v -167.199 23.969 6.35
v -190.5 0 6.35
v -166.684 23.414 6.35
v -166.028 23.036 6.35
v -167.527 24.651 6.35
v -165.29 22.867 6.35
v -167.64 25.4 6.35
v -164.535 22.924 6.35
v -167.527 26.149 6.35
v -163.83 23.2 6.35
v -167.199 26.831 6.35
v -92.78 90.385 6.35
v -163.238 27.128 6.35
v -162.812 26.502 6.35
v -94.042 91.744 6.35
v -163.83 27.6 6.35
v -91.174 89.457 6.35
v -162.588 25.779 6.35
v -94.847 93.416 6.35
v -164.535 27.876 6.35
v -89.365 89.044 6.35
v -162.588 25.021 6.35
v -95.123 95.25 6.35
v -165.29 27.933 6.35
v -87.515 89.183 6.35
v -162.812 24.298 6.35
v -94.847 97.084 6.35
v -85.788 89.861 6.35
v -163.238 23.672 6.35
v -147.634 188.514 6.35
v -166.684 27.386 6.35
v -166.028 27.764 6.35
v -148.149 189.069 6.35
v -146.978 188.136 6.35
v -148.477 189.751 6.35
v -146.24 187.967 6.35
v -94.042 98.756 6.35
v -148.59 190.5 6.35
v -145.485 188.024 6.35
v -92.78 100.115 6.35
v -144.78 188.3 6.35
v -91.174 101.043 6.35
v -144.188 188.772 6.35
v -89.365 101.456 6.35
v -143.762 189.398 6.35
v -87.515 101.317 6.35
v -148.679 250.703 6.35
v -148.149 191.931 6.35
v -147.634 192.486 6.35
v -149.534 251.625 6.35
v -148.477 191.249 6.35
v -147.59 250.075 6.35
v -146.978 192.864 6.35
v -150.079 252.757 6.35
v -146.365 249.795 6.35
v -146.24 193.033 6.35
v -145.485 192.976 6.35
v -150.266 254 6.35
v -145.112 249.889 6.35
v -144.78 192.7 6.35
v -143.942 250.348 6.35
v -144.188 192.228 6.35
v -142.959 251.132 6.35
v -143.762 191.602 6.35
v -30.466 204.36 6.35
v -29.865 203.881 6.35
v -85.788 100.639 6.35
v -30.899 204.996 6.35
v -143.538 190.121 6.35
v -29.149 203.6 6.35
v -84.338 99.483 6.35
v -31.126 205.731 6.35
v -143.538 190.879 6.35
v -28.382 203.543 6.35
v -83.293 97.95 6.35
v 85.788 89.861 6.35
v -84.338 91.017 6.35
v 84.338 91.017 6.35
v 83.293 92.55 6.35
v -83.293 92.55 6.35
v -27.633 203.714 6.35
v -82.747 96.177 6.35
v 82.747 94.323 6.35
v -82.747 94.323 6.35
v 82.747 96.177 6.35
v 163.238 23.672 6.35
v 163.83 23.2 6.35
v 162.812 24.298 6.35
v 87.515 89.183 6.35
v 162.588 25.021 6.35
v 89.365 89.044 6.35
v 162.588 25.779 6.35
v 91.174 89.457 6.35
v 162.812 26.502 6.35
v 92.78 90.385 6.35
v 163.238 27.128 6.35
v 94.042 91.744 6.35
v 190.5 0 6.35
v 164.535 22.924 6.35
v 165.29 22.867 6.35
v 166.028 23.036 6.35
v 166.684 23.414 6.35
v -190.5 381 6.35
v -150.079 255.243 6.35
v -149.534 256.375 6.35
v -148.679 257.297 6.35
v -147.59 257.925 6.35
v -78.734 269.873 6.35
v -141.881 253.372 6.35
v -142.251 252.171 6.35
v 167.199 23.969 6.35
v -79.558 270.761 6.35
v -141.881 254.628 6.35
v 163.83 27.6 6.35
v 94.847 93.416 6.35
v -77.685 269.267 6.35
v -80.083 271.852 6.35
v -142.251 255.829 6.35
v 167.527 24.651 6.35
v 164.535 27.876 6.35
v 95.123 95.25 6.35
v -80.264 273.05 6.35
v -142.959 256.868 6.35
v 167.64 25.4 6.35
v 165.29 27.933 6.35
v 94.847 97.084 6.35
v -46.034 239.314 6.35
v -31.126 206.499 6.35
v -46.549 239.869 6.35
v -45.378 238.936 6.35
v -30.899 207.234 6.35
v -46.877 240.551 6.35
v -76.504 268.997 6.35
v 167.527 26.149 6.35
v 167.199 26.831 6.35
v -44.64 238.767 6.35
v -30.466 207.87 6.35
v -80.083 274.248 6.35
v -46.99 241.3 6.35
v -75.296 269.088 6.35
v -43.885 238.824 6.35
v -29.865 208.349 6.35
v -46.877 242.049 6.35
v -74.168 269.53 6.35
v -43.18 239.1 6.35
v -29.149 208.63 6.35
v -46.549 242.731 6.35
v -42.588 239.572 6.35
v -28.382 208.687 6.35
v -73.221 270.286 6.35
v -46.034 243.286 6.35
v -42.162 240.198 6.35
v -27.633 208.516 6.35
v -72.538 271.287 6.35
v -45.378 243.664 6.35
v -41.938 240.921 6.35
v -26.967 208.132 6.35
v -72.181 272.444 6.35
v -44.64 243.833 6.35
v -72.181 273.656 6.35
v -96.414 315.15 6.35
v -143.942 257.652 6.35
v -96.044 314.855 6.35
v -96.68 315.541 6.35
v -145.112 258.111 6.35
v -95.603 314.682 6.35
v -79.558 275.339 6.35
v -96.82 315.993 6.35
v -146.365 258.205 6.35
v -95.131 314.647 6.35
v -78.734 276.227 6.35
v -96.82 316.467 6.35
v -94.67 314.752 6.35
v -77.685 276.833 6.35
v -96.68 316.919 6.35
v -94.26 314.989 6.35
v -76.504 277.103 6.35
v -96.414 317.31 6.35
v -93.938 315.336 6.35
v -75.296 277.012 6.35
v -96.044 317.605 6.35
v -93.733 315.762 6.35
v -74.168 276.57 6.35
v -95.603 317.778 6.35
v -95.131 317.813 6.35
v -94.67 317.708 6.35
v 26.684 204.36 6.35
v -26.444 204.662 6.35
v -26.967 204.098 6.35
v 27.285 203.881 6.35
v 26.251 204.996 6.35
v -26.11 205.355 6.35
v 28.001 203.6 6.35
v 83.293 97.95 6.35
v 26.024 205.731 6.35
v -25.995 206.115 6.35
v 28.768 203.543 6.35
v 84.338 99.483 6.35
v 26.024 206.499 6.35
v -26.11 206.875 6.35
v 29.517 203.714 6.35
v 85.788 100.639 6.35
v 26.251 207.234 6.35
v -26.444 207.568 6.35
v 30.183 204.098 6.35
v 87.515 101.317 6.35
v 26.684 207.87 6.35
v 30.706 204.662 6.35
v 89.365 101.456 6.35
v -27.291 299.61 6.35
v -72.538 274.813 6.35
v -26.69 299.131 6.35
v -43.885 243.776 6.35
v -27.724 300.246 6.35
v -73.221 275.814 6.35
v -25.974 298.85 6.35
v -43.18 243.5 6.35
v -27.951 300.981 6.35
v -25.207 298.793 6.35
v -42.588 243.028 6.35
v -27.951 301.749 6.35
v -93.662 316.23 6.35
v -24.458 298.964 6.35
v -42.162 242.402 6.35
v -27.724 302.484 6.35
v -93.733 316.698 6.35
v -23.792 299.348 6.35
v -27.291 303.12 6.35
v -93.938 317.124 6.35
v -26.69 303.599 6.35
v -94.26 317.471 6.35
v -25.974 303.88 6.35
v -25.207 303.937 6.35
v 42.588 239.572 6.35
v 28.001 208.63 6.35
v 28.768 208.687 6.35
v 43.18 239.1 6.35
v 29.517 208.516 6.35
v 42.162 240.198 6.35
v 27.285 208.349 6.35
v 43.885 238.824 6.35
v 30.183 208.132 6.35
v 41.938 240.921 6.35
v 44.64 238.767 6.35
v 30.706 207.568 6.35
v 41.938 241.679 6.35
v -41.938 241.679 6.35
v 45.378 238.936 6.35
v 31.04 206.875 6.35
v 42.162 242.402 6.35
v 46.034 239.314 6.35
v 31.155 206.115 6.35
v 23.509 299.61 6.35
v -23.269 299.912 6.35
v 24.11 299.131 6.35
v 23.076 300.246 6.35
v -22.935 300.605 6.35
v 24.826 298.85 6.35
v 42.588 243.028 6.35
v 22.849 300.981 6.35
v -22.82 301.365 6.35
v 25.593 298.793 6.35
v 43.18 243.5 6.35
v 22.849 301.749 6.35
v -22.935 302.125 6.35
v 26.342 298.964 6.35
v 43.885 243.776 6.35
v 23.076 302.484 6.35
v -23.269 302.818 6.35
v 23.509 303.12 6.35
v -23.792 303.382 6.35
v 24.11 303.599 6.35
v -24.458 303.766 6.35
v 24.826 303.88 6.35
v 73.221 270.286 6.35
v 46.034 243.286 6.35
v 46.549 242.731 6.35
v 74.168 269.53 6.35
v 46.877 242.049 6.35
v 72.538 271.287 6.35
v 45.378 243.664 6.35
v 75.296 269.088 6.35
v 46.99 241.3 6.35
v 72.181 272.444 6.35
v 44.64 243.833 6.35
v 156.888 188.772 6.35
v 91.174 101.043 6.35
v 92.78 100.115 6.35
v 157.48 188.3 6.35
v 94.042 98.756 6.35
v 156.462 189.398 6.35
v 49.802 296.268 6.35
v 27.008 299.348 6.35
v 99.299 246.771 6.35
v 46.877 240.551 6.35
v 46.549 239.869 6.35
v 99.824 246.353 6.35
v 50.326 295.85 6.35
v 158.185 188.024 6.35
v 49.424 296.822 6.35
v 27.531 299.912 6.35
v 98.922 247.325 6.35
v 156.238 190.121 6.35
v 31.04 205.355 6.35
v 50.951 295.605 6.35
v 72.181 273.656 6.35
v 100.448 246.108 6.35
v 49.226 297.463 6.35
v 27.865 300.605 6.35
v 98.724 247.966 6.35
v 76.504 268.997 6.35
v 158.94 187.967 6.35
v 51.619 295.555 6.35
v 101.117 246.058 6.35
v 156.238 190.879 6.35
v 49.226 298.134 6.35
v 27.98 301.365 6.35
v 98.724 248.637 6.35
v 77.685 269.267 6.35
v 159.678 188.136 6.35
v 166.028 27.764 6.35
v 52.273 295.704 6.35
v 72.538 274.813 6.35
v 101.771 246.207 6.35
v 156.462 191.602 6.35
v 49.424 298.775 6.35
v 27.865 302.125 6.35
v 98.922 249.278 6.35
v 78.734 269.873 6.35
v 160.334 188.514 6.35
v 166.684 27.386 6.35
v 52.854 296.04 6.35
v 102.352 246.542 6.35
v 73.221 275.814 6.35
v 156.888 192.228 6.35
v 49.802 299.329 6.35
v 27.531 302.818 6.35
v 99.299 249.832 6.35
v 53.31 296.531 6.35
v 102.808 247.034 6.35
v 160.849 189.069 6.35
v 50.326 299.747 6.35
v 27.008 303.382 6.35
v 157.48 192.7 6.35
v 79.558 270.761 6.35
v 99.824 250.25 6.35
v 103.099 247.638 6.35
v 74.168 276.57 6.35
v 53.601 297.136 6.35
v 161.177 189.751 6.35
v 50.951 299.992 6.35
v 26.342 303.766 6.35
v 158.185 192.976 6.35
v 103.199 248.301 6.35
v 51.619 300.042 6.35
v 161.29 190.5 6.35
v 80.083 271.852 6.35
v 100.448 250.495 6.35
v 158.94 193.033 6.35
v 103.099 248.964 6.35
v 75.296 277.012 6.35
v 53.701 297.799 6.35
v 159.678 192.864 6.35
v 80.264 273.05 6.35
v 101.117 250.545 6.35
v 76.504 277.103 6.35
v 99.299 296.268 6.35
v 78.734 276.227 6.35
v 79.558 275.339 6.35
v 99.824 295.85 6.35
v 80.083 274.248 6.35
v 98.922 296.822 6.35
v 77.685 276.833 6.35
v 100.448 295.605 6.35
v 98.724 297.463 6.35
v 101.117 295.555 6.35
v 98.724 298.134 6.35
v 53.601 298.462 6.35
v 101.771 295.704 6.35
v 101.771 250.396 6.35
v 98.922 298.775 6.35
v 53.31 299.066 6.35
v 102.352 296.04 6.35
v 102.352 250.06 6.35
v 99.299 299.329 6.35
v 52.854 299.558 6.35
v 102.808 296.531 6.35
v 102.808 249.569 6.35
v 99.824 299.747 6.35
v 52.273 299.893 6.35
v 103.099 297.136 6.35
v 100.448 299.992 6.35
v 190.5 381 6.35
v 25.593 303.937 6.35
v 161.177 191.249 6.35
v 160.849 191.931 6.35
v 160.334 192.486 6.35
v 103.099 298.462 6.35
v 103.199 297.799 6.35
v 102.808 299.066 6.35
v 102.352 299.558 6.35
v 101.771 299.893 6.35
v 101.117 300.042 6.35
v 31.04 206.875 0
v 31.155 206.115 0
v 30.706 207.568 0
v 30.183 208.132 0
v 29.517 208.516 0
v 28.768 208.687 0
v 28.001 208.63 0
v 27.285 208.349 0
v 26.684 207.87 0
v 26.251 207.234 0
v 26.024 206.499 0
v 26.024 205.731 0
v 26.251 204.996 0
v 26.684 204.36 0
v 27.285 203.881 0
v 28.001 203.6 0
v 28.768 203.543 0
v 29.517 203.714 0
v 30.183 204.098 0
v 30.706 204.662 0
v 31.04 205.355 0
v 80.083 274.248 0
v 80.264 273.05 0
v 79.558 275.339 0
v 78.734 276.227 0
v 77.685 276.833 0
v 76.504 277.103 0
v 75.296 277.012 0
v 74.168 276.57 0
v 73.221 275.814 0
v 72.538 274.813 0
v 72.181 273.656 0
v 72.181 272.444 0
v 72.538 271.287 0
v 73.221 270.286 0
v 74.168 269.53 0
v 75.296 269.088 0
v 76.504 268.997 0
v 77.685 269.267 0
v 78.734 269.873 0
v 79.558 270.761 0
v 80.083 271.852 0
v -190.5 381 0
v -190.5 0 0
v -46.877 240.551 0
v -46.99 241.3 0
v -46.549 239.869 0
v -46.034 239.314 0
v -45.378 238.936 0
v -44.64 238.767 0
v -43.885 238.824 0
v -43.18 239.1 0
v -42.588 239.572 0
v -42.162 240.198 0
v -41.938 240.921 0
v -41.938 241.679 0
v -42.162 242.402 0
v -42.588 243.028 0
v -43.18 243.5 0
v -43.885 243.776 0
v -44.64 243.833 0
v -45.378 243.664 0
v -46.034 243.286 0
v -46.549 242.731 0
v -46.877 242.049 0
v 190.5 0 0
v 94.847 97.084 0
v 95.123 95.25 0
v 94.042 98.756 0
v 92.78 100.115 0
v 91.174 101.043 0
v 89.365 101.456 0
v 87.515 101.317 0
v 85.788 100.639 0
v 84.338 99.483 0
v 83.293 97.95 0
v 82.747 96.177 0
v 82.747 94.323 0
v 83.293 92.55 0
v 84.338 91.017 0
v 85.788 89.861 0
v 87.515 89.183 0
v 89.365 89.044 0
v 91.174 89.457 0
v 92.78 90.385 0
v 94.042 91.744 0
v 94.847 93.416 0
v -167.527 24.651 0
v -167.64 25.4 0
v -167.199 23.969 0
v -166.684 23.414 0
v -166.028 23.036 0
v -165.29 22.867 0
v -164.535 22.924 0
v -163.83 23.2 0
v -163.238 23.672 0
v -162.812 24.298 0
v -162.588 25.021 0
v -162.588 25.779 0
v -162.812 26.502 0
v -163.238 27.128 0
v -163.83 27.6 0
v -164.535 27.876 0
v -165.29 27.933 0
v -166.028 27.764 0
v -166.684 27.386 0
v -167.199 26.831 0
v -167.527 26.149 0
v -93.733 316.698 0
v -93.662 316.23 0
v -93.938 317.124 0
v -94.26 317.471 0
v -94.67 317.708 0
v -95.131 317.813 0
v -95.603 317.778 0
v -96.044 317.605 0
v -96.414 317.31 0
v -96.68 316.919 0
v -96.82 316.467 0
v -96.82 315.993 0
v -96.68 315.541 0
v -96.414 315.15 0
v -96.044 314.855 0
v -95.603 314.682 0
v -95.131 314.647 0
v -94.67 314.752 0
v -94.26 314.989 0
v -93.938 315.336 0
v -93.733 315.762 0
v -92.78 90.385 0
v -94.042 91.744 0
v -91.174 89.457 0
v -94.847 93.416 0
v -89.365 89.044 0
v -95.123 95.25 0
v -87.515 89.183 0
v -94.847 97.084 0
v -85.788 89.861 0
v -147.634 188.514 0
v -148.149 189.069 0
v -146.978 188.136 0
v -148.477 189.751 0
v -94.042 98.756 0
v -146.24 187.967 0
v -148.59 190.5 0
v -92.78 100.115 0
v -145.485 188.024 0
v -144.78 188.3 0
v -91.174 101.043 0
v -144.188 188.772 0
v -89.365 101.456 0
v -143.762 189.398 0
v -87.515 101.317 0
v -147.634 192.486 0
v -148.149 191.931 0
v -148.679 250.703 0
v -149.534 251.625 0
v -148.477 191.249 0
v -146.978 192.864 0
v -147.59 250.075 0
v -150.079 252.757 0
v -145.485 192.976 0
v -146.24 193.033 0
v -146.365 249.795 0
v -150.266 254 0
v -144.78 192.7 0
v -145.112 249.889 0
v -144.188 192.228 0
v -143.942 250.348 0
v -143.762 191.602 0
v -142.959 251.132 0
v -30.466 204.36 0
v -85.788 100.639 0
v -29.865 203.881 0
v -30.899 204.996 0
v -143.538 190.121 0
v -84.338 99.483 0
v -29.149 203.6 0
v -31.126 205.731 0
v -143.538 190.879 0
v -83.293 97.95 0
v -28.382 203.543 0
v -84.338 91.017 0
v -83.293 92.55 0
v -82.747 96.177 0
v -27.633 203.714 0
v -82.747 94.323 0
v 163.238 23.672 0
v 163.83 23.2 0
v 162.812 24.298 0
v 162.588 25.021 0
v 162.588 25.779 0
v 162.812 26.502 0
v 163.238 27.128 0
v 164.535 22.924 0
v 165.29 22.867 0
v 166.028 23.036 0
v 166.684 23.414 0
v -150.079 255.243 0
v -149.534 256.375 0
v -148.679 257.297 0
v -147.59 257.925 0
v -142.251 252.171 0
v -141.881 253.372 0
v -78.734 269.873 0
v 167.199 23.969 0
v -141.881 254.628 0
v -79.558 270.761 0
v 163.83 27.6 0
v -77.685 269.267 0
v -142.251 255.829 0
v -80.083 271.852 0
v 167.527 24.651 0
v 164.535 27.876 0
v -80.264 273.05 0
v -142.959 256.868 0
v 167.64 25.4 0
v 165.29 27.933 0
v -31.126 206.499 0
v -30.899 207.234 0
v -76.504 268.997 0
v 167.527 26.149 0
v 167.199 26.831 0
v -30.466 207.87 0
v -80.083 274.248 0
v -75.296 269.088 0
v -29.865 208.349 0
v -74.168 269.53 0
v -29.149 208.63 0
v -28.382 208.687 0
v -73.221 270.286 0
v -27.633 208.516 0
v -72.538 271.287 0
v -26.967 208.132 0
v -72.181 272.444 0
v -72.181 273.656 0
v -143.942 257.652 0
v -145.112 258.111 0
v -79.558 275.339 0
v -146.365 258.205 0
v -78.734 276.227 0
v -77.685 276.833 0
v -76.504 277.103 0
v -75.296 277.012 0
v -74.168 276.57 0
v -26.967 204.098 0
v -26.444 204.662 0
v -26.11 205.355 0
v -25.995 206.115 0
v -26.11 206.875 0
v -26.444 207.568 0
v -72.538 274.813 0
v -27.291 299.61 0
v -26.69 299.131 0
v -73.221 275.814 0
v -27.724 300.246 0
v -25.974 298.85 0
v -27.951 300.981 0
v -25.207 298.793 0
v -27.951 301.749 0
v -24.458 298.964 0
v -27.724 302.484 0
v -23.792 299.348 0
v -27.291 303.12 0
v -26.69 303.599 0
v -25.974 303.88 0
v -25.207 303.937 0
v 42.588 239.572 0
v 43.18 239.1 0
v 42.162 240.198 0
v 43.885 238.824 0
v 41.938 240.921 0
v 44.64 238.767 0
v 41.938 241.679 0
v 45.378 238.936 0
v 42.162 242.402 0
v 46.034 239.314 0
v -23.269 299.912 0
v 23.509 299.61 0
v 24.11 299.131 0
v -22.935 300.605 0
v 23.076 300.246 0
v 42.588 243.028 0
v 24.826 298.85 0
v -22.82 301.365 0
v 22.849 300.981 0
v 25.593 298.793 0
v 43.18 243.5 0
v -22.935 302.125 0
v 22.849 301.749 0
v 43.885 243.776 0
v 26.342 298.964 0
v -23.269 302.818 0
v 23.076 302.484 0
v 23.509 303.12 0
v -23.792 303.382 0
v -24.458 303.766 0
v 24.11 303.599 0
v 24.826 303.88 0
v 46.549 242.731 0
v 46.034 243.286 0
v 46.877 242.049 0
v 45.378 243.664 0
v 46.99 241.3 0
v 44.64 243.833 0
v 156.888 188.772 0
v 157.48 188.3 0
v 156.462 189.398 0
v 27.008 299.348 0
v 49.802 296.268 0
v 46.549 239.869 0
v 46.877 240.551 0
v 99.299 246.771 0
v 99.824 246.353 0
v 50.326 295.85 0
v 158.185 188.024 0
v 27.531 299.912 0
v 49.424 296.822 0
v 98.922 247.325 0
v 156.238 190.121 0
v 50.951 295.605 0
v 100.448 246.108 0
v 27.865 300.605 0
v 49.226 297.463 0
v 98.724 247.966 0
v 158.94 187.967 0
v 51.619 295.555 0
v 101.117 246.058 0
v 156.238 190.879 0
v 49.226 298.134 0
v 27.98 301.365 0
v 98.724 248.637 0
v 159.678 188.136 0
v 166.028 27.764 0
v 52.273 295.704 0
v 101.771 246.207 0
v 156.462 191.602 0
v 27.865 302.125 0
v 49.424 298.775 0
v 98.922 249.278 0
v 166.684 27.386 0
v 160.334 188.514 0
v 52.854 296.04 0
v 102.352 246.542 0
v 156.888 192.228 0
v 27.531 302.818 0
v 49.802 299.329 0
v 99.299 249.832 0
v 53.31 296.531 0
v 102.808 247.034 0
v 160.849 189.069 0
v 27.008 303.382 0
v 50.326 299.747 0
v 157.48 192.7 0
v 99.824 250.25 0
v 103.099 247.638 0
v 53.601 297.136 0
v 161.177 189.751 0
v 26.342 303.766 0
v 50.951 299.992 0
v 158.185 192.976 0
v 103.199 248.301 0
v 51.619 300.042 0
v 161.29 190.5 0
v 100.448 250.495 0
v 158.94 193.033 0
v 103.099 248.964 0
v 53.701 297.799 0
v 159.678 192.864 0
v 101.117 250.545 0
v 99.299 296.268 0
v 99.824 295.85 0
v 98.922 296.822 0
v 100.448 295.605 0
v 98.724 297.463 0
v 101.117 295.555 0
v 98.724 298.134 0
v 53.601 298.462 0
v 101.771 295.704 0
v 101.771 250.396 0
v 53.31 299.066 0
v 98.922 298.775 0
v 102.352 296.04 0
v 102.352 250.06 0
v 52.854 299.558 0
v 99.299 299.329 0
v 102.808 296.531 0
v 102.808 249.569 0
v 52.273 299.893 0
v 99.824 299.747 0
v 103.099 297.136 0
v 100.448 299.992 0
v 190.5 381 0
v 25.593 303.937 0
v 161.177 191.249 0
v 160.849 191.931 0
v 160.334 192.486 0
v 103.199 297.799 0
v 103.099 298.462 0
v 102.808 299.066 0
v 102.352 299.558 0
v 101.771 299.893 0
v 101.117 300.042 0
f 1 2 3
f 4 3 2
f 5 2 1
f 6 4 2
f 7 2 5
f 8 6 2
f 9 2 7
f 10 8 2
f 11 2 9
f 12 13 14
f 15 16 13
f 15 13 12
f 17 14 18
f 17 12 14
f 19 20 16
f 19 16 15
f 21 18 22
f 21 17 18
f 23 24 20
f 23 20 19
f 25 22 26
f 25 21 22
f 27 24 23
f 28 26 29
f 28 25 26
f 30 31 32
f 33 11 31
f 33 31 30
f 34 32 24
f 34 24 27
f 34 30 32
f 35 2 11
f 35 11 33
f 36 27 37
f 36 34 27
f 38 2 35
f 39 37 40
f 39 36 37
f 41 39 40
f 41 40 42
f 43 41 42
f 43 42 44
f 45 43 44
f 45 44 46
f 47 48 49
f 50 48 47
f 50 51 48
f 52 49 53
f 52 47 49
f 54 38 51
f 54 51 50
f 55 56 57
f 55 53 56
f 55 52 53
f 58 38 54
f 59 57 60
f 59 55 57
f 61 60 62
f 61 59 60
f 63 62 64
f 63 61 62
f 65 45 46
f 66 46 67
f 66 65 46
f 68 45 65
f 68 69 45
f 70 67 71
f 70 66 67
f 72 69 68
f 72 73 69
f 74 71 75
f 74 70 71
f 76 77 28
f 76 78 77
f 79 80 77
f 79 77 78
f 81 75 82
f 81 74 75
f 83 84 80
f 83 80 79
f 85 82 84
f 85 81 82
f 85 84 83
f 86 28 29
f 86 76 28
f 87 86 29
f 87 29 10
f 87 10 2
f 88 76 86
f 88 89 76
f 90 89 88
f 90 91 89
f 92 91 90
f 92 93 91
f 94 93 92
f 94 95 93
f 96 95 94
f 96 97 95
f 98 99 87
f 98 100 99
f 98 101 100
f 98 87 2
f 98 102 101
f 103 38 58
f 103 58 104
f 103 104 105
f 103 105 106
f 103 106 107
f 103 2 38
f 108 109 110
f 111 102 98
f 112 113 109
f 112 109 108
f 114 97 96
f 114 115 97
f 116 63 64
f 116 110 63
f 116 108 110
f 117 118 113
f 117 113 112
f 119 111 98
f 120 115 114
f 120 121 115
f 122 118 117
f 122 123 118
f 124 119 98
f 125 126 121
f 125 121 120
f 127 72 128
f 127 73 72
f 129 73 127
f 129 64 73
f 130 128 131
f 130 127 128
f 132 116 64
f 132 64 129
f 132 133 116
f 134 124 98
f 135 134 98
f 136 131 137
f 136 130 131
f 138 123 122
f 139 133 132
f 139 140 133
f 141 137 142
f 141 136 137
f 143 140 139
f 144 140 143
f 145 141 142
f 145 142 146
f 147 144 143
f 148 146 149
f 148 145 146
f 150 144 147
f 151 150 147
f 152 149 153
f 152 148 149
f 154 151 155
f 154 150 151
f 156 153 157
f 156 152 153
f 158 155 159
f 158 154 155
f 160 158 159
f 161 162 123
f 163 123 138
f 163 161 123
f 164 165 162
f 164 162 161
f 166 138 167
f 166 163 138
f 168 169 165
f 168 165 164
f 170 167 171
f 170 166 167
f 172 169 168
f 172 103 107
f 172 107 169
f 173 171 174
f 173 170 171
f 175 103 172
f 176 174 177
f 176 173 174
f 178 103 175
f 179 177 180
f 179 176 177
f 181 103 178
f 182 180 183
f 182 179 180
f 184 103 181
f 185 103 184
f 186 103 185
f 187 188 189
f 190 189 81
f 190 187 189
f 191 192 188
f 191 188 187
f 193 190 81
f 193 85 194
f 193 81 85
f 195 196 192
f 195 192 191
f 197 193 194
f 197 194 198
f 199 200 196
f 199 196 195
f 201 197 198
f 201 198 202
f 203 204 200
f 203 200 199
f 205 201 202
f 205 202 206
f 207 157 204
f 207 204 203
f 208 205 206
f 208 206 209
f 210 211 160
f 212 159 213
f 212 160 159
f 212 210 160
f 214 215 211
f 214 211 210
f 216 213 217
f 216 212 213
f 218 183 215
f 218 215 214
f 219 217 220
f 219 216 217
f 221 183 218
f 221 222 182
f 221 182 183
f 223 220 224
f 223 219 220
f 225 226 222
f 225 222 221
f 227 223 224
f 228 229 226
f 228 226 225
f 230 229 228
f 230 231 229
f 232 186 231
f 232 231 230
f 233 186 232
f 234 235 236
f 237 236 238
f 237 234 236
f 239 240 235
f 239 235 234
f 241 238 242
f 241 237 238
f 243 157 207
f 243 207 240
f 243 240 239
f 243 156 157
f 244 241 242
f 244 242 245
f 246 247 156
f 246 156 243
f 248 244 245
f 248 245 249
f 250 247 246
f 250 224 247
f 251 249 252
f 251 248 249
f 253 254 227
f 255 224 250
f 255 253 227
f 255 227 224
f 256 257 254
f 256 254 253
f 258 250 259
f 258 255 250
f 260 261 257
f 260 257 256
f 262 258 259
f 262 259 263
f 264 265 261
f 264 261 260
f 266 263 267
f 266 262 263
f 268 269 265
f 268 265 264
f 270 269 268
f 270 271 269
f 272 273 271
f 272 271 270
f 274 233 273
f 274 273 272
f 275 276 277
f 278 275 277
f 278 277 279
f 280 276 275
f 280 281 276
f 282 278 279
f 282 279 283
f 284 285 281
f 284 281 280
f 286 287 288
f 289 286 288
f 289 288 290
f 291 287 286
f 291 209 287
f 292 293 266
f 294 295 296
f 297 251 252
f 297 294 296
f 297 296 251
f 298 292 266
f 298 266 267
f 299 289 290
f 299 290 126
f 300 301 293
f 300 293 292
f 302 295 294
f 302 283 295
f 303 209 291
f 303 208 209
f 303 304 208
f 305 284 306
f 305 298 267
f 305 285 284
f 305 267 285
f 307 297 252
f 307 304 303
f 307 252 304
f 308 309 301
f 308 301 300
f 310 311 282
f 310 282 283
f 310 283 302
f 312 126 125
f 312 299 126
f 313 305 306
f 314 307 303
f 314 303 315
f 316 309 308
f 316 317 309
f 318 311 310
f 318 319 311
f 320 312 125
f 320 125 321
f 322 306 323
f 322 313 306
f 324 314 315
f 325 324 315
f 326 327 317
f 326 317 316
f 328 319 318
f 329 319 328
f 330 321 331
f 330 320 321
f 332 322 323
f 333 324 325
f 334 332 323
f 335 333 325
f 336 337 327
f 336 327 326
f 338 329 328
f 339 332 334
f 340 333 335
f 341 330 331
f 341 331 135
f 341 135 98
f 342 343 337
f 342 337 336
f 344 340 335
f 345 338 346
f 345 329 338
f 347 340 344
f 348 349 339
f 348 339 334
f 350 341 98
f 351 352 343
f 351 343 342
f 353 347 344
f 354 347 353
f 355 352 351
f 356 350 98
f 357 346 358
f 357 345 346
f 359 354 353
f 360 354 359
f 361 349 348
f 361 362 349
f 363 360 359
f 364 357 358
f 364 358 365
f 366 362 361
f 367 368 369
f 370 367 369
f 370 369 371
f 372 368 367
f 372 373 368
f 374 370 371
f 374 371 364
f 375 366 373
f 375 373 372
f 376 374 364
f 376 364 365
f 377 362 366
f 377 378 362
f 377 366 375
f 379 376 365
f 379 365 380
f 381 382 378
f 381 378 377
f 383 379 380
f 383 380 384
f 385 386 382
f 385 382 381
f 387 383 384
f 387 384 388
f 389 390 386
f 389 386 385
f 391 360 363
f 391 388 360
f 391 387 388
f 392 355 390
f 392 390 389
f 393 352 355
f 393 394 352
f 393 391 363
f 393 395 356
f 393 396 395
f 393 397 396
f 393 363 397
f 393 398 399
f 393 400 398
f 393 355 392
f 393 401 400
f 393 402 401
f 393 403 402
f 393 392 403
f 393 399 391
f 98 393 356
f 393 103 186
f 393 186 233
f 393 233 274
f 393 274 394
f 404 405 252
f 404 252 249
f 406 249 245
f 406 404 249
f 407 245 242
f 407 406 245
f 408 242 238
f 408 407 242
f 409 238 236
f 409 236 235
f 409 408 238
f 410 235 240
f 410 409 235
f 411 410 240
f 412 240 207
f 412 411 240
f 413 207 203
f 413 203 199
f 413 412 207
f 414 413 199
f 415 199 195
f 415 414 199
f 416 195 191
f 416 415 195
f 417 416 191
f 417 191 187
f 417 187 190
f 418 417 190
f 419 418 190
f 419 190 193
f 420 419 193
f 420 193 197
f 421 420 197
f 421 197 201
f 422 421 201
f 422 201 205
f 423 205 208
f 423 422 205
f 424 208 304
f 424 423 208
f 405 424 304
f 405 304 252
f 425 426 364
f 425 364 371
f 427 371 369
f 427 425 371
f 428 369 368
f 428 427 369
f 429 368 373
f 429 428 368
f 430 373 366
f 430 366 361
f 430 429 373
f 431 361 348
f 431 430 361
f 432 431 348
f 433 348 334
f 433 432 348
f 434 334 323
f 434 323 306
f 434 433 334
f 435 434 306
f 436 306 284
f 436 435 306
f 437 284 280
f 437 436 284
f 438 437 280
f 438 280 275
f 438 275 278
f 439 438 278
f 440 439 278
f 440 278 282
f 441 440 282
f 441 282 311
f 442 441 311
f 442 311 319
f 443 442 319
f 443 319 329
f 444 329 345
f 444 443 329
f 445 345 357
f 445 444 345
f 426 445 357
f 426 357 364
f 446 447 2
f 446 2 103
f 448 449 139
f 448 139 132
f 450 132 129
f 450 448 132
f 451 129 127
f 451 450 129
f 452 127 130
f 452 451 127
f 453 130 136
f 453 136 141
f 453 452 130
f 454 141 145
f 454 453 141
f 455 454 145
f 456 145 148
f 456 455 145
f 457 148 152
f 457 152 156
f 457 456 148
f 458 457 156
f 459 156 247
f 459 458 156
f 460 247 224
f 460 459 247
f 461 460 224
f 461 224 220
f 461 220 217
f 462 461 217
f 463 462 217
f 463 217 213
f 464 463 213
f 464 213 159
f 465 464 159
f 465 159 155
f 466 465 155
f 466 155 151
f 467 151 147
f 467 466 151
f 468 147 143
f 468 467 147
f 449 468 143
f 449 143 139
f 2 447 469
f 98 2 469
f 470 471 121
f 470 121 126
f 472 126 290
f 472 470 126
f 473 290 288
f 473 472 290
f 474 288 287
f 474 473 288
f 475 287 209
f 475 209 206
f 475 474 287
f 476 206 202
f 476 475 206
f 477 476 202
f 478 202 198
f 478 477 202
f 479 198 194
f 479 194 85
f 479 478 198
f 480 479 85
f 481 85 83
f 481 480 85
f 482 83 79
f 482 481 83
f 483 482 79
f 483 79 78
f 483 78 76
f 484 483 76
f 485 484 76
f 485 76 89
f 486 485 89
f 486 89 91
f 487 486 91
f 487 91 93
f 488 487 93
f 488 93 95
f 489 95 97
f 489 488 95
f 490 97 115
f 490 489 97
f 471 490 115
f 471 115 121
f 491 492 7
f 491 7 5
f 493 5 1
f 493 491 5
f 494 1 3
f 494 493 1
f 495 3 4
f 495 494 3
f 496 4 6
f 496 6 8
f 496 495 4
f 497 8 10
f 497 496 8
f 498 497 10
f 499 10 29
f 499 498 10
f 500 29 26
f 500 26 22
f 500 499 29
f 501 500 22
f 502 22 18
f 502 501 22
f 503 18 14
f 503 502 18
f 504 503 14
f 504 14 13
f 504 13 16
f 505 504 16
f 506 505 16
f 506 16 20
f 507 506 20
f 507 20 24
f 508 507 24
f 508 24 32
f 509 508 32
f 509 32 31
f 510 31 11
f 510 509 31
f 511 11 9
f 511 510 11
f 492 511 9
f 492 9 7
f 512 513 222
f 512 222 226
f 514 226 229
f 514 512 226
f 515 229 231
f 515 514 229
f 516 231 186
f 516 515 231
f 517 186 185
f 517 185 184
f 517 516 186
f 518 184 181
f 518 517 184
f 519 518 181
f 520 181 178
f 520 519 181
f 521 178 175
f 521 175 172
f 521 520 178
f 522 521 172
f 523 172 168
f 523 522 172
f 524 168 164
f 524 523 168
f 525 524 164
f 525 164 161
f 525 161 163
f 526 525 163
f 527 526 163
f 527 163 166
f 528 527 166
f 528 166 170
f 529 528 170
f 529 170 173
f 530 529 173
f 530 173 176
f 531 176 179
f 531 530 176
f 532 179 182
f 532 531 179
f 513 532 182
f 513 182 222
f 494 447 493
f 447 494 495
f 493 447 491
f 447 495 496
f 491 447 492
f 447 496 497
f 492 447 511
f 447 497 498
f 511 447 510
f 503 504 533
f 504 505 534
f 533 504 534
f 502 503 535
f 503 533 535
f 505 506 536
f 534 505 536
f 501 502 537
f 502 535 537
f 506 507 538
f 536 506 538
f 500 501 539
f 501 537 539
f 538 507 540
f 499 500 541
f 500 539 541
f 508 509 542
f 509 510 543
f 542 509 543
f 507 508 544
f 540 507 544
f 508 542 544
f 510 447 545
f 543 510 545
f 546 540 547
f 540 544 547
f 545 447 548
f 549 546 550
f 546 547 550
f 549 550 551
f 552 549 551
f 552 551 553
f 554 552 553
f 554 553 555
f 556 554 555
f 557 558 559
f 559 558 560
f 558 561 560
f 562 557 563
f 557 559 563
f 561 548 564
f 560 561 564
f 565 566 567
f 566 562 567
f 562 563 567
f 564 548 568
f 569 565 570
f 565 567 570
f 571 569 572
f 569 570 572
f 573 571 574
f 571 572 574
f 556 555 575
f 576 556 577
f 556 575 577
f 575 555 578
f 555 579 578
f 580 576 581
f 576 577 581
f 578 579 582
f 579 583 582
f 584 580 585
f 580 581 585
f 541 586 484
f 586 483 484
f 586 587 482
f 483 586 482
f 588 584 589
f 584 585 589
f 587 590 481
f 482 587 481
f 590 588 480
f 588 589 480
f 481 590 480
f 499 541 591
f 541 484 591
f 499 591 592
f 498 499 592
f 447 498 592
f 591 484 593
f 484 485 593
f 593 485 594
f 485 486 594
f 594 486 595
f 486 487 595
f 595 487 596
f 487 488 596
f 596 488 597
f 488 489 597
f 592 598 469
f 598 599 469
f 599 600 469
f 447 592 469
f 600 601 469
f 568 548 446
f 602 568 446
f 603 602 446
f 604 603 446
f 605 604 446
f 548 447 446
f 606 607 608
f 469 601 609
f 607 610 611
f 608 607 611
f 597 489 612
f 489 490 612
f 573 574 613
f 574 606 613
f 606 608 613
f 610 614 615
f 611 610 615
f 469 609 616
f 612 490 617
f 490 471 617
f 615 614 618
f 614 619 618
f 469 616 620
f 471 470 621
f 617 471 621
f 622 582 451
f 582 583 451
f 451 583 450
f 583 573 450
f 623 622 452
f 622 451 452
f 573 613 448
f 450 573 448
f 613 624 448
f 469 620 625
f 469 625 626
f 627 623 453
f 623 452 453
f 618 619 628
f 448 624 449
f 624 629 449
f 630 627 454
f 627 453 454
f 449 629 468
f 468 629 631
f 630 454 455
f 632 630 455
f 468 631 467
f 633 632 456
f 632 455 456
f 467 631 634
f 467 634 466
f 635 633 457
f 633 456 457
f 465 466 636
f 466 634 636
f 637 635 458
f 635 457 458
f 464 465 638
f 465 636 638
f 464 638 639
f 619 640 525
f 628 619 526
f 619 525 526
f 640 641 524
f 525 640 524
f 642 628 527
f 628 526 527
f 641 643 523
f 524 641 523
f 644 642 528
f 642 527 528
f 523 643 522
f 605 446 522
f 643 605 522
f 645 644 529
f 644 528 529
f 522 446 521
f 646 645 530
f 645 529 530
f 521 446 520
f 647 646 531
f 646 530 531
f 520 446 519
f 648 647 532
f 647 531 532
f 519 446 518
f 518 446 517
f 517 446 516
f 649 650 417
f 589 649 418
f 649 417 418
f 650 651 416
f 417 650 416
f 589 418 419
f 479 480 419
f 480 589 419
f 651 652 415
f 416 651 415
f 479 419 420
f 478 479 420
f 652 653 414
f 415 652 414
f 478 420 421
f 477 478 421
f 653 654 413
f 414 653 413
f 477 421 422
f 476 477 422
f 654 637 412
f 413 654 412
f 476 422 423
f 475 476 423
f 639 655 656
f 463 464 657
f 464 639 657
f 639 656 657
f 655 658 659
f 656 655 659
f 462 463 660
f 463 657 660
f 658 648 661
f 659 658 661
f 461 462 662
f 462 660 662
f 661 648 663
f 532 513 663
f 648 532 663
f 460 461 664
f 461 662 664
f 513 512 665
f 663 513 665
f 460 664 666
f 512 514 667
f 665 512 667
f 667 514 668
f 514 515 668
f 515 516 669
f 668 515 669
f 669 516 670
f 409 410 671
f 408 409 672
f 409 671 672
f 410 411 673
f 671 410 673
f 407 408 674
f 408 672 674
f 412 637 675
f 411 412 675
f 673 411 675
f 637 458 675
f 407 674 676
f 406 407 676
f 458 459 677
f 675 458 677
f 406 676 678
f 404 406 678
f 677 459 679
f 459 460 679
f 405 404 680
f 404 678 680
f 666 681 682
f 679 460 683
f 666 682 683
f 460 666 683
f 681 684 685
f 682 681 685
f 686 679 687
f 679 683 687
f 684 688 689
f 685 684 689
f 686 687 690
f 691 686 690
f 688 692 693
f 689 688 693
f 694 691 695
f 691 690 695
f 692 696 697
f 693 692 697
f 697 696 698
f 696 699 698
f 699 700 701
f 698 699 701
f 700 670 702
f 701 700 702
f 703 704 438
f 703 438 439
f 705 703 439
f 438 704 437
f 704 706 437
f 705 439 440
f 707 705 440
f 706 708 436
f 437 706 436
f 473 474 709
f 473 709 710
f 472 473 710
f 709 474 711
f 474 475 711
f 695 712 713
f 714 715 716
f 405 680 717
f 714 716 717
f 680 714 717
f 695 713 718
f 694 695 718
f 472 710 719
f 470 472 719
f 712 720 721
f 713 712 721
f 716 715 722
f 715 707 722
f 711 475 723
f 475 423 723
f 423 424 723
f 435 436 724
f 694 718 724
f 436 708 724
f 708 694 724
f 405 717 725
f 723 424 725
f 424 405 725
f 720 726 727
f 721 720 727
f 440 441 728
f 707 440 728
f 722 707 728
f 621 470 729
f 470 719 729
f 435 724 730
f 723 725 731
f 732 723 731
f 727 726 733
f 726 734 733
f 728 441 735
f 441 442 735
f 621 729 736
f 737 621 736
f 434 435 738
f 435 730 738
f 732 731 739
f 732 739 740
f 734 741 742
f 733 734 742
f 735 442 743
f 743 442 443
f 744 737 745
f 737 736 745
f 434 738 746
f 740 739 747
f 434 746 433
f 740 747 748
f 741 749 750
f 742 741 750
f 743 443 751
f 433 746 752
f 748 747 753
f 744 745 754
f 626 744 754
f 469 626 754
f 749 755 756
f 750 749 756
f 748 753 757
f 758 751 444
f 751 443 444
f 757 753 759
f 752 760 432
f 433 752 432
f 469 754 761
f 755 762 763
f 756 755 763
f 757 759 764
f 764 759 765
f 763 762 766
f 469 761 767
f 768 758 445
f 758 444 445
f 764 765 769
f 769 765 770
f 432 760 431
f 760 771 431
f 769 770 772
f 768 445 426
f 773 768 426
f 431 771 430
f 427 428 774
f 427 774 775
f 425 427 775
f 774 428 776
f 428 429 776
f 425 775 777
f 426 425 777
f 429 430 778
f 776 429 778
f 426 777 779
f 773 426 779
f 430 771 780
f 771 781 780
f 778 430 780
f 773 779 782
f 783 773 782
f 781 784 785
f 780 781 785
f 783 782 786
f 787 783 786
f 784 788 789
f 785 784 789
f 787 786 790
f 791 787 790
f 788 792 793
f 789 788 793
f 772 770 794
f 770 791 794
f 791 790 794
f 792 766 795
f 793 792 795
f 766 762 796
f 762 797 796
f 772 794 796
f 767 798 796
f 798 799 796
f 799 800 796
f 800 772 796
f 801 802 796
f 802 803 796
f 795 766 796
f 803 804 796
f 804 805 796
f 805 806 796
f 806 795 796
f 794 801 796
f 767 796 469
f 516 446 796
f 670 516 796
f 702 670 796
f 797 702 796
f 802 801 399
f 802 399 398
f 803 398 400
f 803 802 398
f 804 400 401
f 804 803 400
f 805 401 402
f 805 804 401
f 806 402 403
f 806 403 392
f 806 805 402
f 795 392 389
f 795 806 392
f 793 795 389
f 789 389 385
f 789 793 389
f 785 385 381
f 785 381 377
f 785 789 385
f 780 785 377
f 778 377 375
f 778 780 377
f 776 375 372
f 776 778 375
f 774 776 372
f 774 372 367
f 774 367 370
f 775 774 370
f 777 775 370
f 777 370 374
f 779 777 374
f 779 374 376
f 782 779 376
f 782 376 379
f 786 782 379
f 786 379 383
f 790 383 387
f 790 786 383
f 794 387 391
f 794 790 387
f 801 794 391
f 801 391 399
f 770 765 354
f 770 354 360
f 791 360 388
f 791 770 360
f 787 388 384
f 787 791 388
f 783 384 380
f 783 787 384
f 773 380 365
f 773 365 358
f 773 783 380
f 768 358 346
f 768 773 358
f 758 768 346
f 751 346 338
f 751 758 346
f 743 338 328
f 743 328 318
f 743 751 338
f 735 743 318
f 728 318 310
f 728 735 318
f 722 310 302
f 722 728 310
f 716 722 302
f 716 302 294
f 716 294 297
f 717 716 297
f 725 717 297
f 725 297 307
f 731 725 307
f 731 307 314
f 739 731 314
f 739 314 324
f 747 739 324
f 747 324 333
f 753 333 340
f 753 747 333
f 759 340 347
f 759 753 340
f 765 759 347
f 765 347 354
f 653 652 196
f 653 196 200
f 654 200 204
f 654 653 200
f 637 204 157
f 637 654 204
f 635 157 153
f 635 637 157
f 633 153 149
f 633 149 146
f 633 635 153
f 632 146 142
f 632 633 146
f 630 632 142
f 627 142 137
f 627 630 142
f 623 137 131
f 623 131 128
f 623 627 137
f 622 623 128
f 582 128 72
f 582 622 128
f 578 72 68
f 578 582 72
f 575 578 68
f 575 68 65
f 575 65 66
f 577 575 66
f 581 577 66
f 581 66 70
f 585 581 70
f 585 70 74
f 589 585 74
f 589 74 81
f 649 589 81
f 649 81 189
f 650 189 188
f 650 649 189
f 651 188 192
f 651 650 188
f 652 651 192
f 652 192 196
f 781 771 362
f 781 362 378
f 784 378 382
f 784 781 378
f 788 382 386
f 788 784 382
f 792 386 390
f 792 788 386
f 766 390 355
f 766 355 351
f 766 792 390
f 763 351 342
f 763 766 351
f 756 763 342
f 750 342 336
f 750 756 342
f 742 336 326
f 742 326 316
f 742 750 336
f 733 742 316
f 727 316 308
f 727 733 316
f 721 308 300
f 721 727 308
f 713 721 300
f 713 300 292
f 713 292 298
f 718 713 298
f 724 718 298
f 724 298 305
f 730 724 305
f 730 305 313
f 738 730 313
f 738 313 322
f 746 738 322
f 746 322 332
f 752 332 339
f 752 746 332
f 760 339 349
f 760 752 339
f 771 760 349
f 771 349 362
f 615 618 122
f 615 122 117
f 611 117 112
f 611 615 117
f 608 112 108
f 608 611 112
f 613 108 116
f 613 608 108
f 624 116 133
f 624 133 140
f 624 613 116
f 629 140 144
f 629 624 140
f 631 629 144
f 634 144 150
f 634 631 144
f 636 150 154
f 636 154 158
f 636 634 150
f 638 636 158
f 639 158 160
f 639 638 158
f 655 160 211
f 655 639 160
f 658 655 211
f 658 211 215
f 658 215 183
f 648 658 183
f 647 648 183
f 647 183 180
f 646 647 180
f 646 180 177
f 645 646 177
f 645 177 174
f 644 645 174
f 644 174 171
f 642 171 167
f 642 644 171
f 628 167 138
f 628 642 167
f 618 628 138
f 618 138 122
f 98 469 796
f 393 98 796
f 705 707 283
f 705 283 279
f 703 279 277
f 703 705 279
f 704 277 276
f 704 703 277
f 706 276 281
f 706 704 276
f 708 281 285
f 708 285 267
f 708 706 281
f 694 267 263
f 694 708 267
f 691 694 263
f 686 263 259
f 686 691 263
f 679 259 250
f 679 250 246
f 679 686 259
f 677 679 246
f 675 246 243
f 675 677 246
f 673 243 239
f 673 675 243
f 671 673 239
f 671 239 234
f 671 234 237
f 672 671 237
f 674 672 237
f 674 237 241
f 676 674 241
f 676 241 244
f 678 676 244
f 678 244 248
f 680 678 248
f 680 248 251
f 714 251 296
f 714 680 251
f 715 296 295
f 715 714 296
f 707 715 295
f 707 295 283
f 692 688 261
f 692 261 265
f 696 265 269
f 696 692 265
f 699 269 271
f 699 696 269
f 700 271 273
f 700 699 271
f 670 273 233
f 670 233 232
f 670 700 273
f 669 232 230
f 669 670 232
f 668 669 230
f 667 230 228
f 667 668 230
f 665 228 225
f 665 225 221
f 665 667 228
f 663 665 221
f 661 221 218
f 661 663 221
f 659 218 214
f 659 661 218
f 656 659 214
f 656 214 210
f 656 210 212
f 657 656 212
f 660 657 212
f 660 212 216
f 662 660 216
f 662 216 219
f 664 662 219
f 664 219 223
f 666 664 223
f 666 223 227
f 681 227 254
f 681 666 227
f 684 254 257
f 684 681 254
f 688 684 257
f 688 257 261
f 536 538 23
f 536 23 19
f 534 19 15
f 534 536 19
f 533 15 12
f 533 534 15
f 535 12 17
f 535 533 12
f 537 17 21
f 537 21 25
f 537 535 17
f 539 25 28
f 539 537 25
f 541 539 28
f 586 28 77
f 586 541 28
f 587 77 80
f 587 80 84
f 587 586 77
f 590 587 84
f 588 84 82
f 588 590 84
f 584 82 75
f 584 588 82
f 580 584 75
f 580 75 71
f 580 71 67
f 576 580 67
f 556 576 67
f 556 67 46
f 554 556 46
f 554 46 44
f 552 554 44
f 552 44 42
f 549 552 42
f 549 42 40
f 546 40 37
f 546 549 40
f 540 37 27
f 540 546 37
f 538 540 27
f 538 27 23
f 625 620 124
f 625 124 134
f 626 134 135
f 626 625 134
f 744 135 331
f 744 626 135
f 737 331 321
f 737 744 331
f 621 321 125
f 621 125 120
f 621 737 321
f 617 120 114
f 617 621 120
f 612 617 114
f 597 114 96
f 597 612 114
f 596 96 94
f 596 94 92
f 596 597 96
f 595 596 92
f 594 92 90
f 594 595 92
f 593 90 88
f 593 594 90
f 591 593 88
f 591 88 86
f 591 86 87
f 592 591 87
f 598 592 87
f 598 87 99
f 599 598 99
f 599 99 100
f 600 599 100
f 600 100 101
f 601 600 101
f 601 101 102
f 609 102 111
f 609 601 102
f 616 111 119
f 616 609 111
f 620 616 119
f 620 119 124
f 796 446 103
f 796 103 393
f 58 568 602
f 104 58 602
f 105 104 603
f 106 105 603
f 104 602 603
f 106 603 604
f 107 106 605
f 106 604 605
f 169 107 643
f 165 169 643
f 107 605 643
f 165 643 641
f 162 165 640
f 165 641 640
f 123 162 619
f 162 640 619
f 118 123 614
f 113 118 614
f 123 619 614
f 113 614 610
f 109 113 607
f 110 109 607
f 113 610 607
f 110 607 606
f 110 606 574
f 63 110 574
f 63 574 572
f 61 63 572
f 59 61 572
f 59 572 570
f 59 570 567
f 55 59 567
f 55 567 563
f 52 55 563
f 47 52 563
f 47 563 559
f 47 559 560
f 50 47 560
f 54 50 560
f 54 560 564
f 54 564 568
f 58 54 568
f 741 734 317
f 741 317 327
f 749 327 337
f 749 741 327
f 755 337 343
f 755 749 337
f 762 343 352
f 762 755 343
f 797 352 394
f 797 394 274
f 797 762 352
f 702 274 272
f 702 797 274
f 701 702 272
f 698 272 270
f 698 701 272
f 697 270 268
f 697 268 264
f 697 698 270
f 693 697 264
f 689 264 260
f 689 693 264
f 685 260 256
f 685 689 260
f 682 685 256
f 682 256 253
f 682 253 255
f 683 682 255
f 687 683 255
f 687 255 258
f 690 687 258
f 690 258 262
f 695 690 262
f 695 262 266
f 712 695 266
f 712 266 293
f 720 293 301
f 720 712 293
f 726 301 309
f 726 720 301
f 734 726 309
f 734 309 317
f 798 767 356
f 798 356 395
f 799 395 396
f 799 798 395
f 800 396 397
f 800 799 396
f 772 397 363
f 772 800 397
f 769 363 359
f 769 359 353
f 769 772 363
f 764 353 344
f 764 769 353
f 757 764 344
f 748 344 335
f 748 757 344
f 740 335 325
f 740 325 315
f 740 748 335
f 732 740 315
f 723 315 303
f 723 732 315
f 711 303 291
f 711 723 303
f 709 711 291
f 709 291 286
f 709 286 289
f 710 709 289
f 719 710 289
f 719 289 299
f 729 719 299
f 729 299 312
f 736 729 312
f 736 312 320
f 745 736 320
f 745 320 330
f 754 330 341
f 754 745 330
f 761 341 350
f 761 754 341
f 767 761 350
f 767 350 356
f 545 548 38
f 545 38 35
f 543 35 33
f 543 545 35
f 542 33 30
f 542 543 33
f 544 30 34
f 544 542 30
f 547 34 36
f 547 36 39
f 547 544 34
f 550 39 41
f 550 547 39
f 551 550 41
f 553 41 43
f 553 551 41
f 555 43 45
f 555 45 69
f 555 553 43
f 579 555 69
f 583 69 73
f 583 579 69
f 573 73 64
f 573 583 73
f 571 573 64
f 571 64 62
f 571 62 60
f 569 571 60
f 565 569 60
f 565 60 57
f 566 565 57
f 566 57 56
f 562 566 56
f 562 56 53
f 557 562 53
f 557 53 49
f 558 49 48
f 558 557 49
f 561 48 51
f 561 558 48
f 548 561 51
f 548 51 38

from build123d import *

# Parameters (mm, degrees)
SKETCH1_W               = 381
SKETCH1_H               = 381
SKETCH1_R               = 4.064
SKETCH1_R_2             = 2.54
SKETCH1_R_3             = 6.223
SKETCH1_R_4             = 2.25
SKETCH1_R_5             = 2.5796875
SKETCH1_R_6             = 1.5875
BOSS_EXTRUDE1_DEPTH     = 6.35
F_3_8_24_TAPPED_HOLE2_D = 8.4328


with BuildPart() as part:
    # Sketch1 → Boss-Extrude1 (new body)
    with BuildSketch(Plane.XY):
        with Locations((0, 190.5)):
            Rectangle(SKETCH1_W, SKETCH1_H)
        with Locations((76.2, 273.05)):
            Circle(SKETCH1_R, mode=Mode.SUBTRACT)
        with Locations((44.45, 241.3)):
            Circle(SKETCH1_R_2, mode=Mode.SUBTRACT)
        with Locations((88.9, 95.25)):
            Circle(SKETCH1_R_3, mode=Mode.SUBTRACT)
        with Locations(Location((-165.1, 25.4, 0), (0, 0, 180))):
            Circle(SKETCH1_R_2, mode=Mode.SUBTRACT)
        with Locations((100.948737342, 297.798737342)):
            Circle(SKETCH1_R_4, mode=Mode.SUBTRACT)
        with Locations((158.75, 190.5)):
            Circle(SKETCH1_R_2, mode=Mode.SUBTRACT)
        with Locations((51.451262658, 297.798737342)):
            Circle(SKETCH1_R_4, mode=Mode.SUBTRACT)
        with Locations((165.1, 25.4)):
            Circle(SKETCH1_R_2, mode=Mode.SUBTRACT)
        with Locations(Location((-88.9, 95.25, 0), (0, 0, 180))):
            Circle(SKETCH1_R_3, mode=Mode.SUBTRACT)
        with Locations((28.575, 206.115)):
            Circle(SKETCH1_R_5, mode=Mode.SUBTRACT)
        with Locations(Location((-146.05, 190.5, 0), (0, 0, 180))):
            Circle(SKETCH1_R_2, mode=Mode.SUBTRACT)
        with Locations((-25.4, 301.365)):
            Circle(SKETCH1_R_5, mode=Mode.SUBTRACT)
        with Locations((25.4, 301.365)):
            Circle(SKETCH1_R_5, mode=Mode.SUBTRACT)
        with Locations(Location((-44.45, 241.3, 0), (0, 0, 180))):
            Circle(SKETCH1_R_2, mode=Mode.SUBTRACT)
        with Locations(Location((-76.2, 273.05, 0), (0, 0, 180))):
            Circle(SKETCH1_R, mode=Mode.SUBTRACT)
        with Locations((-28.575, 206.115)):
            Circle(SKETCH1_R_5, mode=Mode.SUBTRACT)
        with Locations((-95.25, 316.23)):
            Circle(SKETCH1_R_6, mode=Mode.SUBTRACT)
        with Locations((100.948737342, 248.301262658)):
            Circle(SKETCH1_R_4, mode=Mode.SUBTRACT)
    extrude(amount=BOSS_EXTRUDE1_DEPTH)

    # 3/8-24 Tapped Hole2 (through all)
    with Locations(Plane.XY.offset(6.35)):
        with Locations((-146.05, 254)):
            Hole(F_3_8_24_TAPPED_HOLE2_D / 2)


solid = part.part
